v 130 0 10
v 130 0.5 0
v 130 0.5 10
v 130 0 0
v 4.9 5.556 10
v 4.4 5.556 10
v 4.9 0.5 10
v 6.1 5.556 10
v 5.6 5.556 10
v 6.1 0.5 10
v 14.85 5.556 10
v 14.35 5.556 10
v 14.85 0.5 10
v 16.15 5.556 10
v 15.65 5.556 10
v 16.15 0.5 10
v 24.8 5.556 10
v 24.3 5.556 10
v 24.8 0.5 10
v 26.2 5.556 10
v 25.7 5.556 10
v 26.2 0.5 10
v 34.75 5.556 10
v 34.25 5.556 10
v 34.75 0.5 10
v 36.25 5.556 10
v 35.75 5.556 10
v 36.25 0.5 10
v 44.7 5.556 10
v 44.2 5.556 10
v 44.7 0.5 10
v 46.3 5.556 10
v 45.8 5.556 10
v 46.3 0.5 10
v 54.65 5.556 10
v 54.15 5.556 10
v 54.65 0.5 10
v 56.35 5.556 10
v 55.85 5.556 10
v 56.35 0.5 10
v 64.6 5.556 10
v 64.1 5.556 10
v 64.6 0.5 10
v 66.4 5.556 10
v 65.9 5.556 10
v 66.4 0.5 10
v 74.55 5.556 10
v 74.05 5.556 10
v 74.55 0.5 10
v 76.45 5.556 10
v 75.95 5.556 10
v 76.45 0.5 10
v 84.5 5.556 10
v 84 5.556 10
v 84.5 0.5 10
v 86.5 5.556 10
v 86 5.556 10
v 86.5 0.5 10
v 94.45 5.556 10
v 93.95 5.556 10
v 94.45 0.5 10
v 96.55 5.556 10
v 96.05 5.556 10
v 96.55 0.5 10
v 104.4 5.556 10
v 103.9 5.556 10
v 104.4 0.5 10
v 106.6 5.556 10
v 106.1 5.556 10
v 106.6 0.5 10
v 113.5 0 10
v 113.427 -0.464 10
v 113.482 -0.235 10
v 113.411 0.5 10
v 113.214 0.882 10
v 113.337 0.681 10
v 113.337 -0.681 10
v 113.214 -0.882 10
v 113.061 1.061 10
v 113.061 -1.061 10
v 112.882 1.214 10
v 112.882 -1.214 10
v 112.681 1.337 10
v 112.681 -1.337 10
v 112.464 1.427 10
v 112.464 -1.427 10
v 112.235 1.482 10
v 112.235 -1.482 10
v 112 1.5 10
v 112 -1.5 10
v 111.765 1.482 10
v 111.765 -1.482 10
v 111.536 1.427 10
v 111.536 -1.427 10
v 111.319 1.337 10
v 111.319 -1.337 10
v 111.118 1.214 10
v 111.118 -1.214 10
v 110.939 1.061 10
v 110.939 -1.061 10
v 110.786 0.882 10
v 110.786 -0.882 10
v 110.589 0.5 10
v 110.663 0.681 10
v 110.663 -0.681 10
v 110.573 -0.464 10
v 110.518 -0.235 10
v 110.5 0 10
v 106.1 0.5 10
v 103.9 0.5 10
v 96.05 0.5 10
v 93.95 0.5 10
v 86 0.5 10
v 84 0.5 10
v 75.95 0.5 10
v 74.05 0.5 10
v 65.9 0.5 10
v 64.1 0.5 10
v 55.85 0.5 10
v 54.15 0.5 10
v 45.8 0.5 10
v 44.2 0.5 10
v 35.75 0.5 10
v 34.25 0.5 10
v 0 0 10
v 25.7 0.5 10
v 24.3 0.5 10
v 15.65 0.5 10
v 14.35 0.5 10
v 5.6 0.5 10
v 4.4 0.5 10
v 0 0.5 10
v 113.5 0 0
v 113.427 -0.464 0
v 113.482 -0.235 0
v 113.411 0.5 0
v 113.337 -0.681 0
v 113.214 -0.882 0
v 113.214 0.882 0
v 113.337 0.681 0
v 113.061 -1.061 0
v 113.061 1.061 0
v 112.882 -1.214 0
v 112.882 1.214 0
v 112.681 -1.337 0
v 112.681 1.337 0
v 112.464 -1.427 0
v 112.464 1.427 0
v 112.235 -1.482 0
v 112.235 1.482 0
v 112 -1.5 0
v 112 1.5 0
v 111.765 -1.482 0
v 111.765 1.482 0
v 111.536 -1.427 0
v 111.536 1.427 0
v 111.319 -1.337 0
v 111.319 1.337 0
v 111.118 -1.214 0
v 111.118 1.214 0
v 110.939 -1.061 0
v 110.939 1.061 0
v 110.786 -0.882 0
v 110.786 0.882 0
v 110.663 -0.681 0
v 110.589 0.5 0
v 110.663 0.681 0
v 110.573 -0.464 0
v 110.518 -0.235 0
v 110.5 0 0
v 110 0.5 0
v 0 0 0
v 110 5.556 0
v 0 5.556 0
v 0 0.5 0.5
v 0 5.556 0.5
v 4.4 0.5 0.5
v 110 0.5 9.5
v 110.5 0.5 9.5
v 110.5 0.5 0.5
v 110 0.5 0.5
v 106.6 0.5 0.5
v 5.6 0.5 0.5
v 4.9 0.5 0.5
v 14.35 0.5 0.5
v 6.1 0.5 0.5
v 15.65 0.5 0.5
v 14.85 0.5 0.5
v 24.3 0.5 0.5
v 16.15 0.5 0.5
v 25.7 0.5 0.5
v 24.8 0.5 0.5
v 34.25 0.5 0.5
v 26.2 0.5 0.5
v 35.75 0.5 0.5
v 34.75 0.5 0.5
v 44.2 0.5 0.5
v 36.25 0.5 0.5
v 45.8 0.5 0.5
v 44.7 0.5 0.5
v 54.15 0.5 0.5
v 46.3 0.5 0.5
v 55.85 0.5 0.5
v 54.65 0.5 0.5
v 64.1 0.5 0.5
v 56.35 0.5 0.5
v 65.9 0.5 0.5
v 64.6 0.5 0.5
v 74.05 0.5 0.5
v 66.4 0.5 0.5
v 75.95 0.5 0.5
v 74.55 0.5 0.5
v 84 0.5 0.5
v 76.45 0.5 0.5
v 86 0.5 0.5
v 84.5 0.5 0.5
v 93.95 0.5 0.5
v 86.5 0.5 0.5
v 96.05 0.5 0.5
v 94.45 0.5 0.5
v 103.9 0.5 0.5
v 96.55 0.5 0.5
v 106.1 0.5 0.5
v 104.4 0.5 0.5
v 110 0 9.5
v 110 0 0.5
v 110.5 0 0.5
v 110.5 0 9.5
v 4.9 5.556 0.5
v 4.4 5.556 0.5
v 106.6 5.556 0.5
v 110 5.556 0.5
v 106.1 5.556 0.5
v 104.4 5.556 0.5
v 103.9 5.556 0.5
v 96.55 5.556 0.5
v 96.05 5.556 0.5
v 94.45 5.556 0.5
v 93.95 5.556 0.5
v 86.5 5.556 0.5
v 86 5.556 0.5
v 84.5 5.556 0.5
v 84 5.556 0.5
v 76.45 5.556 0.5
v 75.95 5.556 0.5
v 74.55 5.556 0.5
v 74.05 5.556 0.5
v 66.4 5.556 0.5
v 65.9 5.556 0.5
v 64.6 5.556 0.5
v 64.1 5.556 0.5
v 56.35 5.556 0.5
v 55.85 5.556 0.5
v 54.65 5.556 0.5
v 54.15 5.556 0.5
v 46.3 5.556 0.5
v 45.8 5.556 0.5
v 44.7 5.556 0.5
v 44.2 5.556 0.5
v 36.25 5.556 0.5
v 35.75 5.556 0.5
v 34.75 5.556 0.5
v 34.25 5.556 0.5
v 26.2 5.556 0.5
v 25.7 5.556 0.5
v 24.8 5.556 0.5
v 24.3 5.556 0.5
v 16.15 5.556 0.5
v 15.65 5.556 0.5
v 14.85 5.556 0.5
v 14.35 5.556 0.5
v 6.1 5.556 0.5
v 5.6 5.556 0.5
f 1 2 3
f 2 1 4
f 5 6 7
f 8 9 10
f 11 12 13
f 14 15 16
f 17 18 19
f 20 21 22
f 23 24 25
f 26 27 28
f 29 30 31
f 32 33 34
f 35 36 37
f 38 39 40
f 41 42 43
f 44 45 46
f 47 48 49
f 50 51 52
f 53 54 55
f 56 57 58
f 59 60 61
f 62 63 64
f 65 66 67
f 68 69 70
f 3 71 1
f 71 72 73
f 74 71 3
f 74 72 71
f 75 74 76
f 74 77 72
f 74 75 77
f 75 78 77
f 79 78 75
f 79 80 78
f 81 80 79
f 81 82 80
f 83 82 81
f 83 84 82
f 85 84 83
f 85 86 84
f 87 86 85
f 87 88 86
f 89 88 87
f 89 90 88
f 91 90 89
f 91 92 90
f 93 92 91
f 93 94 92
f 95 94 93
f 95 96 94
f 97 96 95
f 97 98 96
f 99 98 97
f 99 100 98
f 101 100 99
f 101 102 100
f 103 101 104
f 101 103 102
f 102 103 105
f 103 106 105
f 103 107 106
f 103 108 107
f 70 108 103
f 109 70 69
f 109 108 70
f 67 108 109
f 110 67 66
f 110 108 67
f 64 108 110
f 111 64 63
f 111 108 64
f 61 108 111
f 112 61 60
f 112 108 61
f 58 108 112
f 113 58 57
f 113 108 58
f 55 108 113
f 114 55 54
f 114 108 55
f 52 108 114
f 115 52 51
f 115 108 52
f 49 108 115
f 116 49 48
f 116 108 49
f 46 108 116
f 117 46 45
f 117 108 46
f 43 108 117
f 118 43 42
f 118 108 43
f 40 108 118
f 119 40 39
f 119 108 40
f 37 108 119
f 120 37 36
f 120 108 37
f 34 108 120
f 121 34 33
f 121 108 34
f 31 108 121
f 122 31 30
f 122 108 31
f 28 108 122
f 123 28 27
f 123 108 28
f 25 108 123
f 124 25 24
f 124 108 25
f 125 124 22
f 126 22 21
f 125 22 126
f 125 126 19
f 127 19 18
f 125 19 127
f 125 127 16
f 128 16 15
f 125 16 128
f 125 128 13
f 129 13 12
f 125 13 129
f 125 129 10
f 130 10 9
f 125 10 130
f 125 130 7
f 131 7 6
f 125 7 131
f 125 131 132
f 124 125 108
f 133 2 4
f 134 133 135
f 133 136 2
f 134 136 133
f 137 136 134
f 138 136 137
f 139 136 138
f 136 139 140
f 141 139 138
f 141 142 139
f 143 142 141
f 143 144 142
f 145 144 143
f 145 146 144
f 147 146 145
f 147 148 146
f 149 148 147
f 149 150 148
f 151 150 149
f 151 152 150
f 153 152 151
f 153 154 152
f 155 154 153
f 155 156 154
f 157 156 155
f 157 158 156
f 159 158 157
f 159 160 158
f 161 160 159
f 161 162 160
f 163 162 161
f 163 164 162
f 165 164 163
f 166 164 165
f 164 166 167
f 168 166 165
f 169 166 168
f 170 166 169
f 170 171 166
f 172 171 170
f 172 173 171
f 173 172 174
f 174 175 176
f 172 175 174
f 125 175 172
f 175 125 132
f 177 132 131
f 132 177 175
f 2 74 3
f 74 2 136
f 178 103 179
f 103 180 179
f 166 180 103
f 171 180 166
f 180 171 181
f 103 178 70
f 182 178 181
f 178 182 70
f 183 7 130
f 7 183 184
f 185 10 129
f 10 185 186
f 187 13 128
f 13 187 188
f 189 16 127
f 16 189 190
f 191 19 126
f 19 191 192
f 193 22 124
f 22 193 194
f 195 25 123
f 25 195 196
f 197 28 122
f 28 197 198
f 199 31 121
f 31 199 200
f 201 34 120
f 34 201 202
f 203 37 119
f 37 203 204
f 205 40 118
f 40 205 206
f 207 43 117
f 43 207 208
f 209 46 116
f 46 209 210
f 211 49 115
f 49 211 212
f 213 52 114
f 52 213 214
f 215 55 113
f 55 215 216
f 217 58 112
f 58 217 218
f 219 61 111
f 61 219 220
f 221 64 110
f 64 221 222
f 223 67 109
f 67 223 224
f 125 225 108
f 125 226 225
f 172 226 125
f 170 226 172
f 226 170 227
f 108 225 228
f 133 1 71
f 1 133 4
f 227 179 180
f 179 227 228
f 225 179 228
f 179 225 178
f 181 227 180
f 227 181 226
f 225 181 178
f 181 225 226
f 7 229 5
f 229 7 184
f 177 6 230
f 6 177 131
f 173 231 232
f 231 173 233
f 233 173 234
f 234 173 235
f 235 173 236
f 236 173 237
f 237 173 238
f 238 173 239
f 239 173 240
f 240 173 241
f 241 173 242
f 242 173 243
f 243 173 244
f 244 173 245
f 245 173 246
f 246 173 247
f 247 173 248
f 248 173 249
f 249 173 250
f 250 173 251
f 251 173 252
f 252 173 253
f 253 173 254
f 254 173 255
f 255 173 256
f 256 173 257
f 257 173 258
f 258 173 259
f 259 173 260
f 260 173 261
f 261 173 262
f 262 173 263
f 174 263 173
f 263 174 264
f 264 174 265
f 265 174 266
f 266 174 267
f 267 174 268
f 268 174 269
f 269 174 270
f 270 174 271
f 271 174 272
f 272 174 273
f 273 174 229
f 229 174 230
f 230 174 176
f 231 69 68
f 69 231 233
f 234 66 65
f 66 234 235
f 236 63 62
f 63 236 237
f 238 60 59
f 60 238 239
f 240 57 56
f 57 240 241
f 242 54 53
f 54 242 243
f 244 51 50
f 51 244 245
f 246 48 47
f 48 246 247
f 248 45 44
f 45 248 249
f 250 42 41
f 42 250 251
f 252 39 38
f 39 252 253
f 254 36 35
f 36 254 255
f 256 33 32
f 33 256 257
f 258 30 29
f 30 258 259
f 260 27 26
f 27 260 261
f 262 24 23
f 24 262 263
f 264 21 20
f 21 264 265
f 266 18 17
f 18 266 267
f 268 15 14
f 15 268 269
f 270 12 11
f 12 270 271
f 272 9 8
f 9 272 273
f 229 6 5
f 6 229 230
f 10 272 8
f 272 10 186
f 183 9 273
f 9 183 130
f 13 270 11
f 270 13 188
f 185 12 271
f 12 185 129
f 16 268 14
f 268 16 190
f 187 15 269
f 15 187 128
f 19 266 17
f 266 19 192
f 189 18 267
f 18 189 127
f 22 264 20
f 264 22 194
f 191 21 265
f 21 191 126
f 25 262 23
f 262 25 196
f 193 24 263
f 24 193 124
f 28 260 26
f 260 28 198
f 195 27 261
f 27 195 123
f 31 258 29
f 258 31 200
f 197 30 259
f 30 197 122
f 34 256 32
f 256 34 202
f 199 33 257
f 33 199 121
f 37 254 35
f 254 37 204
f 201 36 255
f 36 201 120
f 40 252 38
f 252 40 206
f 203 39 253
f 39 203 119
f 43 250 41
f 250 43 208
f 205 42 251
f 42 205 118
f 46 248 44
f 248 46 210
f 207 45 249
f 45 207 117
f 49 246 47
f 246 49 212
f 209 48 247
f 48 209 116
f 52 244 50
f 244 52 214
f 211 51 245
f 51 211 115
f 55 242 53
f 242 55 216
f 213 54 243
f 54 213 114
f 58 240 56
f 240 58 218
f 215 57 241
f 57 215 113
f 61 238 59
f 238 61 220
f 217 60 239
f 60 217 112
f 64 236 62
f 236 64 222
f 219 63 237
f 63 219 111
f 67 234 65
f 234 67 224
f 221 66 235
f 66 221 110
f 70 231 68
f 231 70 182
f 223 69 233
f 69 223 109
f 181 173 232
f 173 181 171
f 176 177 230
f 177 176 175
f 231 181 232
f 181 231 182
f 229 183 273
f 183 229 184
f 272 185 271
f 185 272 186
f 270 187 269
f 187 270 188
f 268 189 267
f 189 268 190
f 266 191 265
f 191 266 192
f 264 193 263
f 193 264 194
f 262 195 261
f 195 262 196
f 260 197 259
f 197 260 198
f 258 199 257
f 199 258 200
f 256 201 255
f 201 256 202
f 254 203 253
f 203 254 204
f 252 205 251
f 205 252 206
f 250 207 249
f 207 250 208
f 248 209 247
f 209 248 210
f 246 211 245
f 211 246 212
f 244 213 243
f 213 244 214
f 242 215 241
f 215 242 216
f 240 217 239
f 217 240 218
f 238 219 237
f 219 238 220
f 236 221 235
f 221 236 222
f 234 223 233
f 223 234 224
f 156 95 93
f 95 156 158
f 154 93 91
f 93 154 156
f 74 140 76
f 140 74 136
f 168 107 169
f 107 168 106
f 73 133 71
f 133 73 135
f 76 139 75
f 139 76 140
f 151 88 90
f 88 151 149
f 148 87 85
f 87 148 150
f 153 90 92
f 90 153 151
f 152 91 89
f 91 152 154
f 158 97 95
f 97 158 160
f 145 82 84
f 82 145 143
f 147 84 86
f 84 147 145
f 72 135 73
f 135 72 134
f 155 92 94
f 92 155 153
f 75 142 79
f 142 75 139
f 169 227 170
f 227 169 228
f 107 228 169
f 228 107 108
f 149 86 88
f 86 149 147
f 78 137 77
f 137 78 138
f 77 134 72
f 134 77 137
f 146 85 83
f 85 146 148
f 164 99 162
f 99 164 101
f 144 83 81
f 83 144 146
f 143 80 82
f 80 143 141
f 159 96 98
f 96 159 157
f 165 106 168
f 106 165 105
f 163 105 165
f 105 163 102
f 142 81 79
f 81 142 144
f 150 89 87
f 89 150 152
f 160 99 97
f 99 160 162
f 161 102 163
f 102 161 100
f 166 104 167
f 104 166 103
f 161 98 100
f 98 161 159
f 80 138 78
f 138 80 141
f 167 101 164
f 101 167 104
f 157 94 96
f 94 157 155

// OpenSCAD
//
//  WordClockMatrix.scad
//
//  Use this to print an LED grid for a Word Clock
//
//  V1.1    2019-04-08 kater

// Use one of the following sections, leave the other(s) commented out
// At the bottom, choose whether to print one single part or four quarter parts

// small RIBBA (23 cm, 13x13 LEDs, small cells)
frame = 230;    // frame size in mm (x and y)
numCells = 13;  // number of cells (x and y)
cell = 1000/60; // cell size in mm; LED strip has 60 LEDs per meter
wall = 0.5;     // wall thickness -- may have to be increased if your slicer omits walls!
height = 10;    // grid height in mm
foot = 4;       // foot size in mm (diamonds in grid junctions)
factor = 1.2;   // sizing for wall receptors

/*
// large RIBBA (50 cm, 12x12 LEDs, large cells)
frame = 500;    // frame size in mm (x and y)
numCells = 12;  // number of cells (x and y);
                // when printing quarters: number will be incremented to be odd
cell = 1000/30; // cell size in mm; LED strip has 30 LEDs per meter
wall = 0.4;     // wall thickness
height = 20;    // grid height in mm
foot = 4;       // foot size in mm (diamonds in grid junctions)
*/

margin = (frame - cell * numCells) / 2;
numQuarterCells = floor(numCells/2)+1;

module SingleMatrix(withFrame = false) {
    union() {
      if (withFrame) { // outer frame
        cube([frame, wall, height]);
        translate([0, frame-wall, 0])
            cube([frame, wall, height]);
        cube([wall, frame, height]);
        translate([frame-wall, 0, 0])
            cube([wall, frame-wall, height]);
      }
      for (i = [0:numCells]) {
        translate([margin + i * cell, 0, 0])
        {
            // Y direction walls |
            translate([-wall/2,0,0])
            cube([wall, 2 * margin + numCells * cell, height]);
            // feet
                for (j = [0:numCells])
                    translate([0, margin + j * cell,  wall/2]) rotate(45)
                        cube([foot, foot, wall], center=true);
        }
        // X direction walls –
        translate([0, margin + i * cell, 0])
            translate([0,-wall/2,0])
            cube([2 * margin + numCells * cell, wall, height]);
      } // for()
      // support for freestanding walls
    }
}

module MatrixQuarter(withFrame = false) {
  translate([-margin-(numQuarterCells-1/2)*cell, -margin - (numQuarterCells-1/2) * cell,0])
    union() {
      if (withFrame) { // outer frame
        cube([margin + numQuarterCells * cell - wall, wall, height]);
        cube([wall, margin + (numQuarterCells-1) * cell, height]);
      }
      for (i = [0:numQuarterCells-1]) {
        translate([margin + i * cell, 0, 0])
        {
            // Y direction walls |
            translate([-wall/2,0,0])
            cube([wall, margin + (numQuarterCells-1) * cell, height]);
            // feet
                for (j = [0:numQuarterCells-1])
                    translate([0, margin + j * cell,  wall/2]) rotate(45)
                        cube([foot, foot, wall], center=true);
        }
        // X direction walls –
        translate([0, margin + i * cell, 0])
            difference() {
            translate([0,-wall/2,0])
            cube([margin + numQuarterCells * cell, wall, height]);
                translate([margin + numQuarterCells * cell - foot, -wall, -wall])
                cube([2*foot, 2*foot, , 3*wall]);
            }
        // wall receptors
        translate([margin + i * cell, margin + (numQuarterCells-1) * cell, 0])
          union() {
            // walls
            translate([-wall * factor, 0, 0])
              cube([wall, foot-1, height]);
            translate([+wall * factor, 0, 0])
              cube([wall, foot-1, height]);
            // funnel  
            translate([-wall * factor + .13, foot - 1.3, 0])
              rotate(45)
              cube([wall, 1.4, height]);
            translate([+wall * factor - .02, foot - 1.0, 0])
              rotate(-45)
              cube([wall, 1.4, height]);
            // foot under receptor
            translate([-foot/2, 0, 0])
              cube([1*foot, foot, wall]);
          }
      } // for()
      // support for freestanding walls
      translate([margin + numQuarterCells * cell - foot, 0, 0])
        for (j = [1:3])
            translate([j, 0, 0])
                cube([0.5, numQuarterCells * cell - foot - margin, wall*2]);
    }
}

module CompoundMatrix(dist = 5, withFrame = false) {
    for(alpha = [0:90:270]) {
        rotate(alpha)
            translate([-dist,-dist,0])
            MatrixQuarter(withFrame);
    }
}

// this will print a test piece to try the best gap value for the wall receptors
module FitTest() {
    num = 10;
    dist = 10;
    cube([(num+1)*dist, cell/3, wall]);
    difference() {
        cube([(num+3)*dist, wall, height]);
        translate([(num+1)*dist, -0.1, wall])
            cube([wall, cell, height-2*wall]);
    }
    translate([(num+1)*dist+2,0,0])
        cylinder(d=3, h=height, $fn=40);
    for (i = [0:num]) {
        factor = 1 + (i+2)*0.1;
        echo(factor);
        translate([dist/2 + i * dist, 0, 0])
          union() {
            translate([-wall * factor, 0, 0])
              cube([wall, cell / 3, height]);
            translate([+wall * factor, 0, 0])
            cube([wall, cell / 3, height]);
          }
    }
      
  // => optimal factor: 2.2 <=> total gap = 2 * wall * 2.2 = 1.76
}

FitTest();
//SingleMatrix();
//CompoundMatrix(dist=10);     // dist=0 to view assembled quarters -- not for printing!
//MatrixQuarter();
